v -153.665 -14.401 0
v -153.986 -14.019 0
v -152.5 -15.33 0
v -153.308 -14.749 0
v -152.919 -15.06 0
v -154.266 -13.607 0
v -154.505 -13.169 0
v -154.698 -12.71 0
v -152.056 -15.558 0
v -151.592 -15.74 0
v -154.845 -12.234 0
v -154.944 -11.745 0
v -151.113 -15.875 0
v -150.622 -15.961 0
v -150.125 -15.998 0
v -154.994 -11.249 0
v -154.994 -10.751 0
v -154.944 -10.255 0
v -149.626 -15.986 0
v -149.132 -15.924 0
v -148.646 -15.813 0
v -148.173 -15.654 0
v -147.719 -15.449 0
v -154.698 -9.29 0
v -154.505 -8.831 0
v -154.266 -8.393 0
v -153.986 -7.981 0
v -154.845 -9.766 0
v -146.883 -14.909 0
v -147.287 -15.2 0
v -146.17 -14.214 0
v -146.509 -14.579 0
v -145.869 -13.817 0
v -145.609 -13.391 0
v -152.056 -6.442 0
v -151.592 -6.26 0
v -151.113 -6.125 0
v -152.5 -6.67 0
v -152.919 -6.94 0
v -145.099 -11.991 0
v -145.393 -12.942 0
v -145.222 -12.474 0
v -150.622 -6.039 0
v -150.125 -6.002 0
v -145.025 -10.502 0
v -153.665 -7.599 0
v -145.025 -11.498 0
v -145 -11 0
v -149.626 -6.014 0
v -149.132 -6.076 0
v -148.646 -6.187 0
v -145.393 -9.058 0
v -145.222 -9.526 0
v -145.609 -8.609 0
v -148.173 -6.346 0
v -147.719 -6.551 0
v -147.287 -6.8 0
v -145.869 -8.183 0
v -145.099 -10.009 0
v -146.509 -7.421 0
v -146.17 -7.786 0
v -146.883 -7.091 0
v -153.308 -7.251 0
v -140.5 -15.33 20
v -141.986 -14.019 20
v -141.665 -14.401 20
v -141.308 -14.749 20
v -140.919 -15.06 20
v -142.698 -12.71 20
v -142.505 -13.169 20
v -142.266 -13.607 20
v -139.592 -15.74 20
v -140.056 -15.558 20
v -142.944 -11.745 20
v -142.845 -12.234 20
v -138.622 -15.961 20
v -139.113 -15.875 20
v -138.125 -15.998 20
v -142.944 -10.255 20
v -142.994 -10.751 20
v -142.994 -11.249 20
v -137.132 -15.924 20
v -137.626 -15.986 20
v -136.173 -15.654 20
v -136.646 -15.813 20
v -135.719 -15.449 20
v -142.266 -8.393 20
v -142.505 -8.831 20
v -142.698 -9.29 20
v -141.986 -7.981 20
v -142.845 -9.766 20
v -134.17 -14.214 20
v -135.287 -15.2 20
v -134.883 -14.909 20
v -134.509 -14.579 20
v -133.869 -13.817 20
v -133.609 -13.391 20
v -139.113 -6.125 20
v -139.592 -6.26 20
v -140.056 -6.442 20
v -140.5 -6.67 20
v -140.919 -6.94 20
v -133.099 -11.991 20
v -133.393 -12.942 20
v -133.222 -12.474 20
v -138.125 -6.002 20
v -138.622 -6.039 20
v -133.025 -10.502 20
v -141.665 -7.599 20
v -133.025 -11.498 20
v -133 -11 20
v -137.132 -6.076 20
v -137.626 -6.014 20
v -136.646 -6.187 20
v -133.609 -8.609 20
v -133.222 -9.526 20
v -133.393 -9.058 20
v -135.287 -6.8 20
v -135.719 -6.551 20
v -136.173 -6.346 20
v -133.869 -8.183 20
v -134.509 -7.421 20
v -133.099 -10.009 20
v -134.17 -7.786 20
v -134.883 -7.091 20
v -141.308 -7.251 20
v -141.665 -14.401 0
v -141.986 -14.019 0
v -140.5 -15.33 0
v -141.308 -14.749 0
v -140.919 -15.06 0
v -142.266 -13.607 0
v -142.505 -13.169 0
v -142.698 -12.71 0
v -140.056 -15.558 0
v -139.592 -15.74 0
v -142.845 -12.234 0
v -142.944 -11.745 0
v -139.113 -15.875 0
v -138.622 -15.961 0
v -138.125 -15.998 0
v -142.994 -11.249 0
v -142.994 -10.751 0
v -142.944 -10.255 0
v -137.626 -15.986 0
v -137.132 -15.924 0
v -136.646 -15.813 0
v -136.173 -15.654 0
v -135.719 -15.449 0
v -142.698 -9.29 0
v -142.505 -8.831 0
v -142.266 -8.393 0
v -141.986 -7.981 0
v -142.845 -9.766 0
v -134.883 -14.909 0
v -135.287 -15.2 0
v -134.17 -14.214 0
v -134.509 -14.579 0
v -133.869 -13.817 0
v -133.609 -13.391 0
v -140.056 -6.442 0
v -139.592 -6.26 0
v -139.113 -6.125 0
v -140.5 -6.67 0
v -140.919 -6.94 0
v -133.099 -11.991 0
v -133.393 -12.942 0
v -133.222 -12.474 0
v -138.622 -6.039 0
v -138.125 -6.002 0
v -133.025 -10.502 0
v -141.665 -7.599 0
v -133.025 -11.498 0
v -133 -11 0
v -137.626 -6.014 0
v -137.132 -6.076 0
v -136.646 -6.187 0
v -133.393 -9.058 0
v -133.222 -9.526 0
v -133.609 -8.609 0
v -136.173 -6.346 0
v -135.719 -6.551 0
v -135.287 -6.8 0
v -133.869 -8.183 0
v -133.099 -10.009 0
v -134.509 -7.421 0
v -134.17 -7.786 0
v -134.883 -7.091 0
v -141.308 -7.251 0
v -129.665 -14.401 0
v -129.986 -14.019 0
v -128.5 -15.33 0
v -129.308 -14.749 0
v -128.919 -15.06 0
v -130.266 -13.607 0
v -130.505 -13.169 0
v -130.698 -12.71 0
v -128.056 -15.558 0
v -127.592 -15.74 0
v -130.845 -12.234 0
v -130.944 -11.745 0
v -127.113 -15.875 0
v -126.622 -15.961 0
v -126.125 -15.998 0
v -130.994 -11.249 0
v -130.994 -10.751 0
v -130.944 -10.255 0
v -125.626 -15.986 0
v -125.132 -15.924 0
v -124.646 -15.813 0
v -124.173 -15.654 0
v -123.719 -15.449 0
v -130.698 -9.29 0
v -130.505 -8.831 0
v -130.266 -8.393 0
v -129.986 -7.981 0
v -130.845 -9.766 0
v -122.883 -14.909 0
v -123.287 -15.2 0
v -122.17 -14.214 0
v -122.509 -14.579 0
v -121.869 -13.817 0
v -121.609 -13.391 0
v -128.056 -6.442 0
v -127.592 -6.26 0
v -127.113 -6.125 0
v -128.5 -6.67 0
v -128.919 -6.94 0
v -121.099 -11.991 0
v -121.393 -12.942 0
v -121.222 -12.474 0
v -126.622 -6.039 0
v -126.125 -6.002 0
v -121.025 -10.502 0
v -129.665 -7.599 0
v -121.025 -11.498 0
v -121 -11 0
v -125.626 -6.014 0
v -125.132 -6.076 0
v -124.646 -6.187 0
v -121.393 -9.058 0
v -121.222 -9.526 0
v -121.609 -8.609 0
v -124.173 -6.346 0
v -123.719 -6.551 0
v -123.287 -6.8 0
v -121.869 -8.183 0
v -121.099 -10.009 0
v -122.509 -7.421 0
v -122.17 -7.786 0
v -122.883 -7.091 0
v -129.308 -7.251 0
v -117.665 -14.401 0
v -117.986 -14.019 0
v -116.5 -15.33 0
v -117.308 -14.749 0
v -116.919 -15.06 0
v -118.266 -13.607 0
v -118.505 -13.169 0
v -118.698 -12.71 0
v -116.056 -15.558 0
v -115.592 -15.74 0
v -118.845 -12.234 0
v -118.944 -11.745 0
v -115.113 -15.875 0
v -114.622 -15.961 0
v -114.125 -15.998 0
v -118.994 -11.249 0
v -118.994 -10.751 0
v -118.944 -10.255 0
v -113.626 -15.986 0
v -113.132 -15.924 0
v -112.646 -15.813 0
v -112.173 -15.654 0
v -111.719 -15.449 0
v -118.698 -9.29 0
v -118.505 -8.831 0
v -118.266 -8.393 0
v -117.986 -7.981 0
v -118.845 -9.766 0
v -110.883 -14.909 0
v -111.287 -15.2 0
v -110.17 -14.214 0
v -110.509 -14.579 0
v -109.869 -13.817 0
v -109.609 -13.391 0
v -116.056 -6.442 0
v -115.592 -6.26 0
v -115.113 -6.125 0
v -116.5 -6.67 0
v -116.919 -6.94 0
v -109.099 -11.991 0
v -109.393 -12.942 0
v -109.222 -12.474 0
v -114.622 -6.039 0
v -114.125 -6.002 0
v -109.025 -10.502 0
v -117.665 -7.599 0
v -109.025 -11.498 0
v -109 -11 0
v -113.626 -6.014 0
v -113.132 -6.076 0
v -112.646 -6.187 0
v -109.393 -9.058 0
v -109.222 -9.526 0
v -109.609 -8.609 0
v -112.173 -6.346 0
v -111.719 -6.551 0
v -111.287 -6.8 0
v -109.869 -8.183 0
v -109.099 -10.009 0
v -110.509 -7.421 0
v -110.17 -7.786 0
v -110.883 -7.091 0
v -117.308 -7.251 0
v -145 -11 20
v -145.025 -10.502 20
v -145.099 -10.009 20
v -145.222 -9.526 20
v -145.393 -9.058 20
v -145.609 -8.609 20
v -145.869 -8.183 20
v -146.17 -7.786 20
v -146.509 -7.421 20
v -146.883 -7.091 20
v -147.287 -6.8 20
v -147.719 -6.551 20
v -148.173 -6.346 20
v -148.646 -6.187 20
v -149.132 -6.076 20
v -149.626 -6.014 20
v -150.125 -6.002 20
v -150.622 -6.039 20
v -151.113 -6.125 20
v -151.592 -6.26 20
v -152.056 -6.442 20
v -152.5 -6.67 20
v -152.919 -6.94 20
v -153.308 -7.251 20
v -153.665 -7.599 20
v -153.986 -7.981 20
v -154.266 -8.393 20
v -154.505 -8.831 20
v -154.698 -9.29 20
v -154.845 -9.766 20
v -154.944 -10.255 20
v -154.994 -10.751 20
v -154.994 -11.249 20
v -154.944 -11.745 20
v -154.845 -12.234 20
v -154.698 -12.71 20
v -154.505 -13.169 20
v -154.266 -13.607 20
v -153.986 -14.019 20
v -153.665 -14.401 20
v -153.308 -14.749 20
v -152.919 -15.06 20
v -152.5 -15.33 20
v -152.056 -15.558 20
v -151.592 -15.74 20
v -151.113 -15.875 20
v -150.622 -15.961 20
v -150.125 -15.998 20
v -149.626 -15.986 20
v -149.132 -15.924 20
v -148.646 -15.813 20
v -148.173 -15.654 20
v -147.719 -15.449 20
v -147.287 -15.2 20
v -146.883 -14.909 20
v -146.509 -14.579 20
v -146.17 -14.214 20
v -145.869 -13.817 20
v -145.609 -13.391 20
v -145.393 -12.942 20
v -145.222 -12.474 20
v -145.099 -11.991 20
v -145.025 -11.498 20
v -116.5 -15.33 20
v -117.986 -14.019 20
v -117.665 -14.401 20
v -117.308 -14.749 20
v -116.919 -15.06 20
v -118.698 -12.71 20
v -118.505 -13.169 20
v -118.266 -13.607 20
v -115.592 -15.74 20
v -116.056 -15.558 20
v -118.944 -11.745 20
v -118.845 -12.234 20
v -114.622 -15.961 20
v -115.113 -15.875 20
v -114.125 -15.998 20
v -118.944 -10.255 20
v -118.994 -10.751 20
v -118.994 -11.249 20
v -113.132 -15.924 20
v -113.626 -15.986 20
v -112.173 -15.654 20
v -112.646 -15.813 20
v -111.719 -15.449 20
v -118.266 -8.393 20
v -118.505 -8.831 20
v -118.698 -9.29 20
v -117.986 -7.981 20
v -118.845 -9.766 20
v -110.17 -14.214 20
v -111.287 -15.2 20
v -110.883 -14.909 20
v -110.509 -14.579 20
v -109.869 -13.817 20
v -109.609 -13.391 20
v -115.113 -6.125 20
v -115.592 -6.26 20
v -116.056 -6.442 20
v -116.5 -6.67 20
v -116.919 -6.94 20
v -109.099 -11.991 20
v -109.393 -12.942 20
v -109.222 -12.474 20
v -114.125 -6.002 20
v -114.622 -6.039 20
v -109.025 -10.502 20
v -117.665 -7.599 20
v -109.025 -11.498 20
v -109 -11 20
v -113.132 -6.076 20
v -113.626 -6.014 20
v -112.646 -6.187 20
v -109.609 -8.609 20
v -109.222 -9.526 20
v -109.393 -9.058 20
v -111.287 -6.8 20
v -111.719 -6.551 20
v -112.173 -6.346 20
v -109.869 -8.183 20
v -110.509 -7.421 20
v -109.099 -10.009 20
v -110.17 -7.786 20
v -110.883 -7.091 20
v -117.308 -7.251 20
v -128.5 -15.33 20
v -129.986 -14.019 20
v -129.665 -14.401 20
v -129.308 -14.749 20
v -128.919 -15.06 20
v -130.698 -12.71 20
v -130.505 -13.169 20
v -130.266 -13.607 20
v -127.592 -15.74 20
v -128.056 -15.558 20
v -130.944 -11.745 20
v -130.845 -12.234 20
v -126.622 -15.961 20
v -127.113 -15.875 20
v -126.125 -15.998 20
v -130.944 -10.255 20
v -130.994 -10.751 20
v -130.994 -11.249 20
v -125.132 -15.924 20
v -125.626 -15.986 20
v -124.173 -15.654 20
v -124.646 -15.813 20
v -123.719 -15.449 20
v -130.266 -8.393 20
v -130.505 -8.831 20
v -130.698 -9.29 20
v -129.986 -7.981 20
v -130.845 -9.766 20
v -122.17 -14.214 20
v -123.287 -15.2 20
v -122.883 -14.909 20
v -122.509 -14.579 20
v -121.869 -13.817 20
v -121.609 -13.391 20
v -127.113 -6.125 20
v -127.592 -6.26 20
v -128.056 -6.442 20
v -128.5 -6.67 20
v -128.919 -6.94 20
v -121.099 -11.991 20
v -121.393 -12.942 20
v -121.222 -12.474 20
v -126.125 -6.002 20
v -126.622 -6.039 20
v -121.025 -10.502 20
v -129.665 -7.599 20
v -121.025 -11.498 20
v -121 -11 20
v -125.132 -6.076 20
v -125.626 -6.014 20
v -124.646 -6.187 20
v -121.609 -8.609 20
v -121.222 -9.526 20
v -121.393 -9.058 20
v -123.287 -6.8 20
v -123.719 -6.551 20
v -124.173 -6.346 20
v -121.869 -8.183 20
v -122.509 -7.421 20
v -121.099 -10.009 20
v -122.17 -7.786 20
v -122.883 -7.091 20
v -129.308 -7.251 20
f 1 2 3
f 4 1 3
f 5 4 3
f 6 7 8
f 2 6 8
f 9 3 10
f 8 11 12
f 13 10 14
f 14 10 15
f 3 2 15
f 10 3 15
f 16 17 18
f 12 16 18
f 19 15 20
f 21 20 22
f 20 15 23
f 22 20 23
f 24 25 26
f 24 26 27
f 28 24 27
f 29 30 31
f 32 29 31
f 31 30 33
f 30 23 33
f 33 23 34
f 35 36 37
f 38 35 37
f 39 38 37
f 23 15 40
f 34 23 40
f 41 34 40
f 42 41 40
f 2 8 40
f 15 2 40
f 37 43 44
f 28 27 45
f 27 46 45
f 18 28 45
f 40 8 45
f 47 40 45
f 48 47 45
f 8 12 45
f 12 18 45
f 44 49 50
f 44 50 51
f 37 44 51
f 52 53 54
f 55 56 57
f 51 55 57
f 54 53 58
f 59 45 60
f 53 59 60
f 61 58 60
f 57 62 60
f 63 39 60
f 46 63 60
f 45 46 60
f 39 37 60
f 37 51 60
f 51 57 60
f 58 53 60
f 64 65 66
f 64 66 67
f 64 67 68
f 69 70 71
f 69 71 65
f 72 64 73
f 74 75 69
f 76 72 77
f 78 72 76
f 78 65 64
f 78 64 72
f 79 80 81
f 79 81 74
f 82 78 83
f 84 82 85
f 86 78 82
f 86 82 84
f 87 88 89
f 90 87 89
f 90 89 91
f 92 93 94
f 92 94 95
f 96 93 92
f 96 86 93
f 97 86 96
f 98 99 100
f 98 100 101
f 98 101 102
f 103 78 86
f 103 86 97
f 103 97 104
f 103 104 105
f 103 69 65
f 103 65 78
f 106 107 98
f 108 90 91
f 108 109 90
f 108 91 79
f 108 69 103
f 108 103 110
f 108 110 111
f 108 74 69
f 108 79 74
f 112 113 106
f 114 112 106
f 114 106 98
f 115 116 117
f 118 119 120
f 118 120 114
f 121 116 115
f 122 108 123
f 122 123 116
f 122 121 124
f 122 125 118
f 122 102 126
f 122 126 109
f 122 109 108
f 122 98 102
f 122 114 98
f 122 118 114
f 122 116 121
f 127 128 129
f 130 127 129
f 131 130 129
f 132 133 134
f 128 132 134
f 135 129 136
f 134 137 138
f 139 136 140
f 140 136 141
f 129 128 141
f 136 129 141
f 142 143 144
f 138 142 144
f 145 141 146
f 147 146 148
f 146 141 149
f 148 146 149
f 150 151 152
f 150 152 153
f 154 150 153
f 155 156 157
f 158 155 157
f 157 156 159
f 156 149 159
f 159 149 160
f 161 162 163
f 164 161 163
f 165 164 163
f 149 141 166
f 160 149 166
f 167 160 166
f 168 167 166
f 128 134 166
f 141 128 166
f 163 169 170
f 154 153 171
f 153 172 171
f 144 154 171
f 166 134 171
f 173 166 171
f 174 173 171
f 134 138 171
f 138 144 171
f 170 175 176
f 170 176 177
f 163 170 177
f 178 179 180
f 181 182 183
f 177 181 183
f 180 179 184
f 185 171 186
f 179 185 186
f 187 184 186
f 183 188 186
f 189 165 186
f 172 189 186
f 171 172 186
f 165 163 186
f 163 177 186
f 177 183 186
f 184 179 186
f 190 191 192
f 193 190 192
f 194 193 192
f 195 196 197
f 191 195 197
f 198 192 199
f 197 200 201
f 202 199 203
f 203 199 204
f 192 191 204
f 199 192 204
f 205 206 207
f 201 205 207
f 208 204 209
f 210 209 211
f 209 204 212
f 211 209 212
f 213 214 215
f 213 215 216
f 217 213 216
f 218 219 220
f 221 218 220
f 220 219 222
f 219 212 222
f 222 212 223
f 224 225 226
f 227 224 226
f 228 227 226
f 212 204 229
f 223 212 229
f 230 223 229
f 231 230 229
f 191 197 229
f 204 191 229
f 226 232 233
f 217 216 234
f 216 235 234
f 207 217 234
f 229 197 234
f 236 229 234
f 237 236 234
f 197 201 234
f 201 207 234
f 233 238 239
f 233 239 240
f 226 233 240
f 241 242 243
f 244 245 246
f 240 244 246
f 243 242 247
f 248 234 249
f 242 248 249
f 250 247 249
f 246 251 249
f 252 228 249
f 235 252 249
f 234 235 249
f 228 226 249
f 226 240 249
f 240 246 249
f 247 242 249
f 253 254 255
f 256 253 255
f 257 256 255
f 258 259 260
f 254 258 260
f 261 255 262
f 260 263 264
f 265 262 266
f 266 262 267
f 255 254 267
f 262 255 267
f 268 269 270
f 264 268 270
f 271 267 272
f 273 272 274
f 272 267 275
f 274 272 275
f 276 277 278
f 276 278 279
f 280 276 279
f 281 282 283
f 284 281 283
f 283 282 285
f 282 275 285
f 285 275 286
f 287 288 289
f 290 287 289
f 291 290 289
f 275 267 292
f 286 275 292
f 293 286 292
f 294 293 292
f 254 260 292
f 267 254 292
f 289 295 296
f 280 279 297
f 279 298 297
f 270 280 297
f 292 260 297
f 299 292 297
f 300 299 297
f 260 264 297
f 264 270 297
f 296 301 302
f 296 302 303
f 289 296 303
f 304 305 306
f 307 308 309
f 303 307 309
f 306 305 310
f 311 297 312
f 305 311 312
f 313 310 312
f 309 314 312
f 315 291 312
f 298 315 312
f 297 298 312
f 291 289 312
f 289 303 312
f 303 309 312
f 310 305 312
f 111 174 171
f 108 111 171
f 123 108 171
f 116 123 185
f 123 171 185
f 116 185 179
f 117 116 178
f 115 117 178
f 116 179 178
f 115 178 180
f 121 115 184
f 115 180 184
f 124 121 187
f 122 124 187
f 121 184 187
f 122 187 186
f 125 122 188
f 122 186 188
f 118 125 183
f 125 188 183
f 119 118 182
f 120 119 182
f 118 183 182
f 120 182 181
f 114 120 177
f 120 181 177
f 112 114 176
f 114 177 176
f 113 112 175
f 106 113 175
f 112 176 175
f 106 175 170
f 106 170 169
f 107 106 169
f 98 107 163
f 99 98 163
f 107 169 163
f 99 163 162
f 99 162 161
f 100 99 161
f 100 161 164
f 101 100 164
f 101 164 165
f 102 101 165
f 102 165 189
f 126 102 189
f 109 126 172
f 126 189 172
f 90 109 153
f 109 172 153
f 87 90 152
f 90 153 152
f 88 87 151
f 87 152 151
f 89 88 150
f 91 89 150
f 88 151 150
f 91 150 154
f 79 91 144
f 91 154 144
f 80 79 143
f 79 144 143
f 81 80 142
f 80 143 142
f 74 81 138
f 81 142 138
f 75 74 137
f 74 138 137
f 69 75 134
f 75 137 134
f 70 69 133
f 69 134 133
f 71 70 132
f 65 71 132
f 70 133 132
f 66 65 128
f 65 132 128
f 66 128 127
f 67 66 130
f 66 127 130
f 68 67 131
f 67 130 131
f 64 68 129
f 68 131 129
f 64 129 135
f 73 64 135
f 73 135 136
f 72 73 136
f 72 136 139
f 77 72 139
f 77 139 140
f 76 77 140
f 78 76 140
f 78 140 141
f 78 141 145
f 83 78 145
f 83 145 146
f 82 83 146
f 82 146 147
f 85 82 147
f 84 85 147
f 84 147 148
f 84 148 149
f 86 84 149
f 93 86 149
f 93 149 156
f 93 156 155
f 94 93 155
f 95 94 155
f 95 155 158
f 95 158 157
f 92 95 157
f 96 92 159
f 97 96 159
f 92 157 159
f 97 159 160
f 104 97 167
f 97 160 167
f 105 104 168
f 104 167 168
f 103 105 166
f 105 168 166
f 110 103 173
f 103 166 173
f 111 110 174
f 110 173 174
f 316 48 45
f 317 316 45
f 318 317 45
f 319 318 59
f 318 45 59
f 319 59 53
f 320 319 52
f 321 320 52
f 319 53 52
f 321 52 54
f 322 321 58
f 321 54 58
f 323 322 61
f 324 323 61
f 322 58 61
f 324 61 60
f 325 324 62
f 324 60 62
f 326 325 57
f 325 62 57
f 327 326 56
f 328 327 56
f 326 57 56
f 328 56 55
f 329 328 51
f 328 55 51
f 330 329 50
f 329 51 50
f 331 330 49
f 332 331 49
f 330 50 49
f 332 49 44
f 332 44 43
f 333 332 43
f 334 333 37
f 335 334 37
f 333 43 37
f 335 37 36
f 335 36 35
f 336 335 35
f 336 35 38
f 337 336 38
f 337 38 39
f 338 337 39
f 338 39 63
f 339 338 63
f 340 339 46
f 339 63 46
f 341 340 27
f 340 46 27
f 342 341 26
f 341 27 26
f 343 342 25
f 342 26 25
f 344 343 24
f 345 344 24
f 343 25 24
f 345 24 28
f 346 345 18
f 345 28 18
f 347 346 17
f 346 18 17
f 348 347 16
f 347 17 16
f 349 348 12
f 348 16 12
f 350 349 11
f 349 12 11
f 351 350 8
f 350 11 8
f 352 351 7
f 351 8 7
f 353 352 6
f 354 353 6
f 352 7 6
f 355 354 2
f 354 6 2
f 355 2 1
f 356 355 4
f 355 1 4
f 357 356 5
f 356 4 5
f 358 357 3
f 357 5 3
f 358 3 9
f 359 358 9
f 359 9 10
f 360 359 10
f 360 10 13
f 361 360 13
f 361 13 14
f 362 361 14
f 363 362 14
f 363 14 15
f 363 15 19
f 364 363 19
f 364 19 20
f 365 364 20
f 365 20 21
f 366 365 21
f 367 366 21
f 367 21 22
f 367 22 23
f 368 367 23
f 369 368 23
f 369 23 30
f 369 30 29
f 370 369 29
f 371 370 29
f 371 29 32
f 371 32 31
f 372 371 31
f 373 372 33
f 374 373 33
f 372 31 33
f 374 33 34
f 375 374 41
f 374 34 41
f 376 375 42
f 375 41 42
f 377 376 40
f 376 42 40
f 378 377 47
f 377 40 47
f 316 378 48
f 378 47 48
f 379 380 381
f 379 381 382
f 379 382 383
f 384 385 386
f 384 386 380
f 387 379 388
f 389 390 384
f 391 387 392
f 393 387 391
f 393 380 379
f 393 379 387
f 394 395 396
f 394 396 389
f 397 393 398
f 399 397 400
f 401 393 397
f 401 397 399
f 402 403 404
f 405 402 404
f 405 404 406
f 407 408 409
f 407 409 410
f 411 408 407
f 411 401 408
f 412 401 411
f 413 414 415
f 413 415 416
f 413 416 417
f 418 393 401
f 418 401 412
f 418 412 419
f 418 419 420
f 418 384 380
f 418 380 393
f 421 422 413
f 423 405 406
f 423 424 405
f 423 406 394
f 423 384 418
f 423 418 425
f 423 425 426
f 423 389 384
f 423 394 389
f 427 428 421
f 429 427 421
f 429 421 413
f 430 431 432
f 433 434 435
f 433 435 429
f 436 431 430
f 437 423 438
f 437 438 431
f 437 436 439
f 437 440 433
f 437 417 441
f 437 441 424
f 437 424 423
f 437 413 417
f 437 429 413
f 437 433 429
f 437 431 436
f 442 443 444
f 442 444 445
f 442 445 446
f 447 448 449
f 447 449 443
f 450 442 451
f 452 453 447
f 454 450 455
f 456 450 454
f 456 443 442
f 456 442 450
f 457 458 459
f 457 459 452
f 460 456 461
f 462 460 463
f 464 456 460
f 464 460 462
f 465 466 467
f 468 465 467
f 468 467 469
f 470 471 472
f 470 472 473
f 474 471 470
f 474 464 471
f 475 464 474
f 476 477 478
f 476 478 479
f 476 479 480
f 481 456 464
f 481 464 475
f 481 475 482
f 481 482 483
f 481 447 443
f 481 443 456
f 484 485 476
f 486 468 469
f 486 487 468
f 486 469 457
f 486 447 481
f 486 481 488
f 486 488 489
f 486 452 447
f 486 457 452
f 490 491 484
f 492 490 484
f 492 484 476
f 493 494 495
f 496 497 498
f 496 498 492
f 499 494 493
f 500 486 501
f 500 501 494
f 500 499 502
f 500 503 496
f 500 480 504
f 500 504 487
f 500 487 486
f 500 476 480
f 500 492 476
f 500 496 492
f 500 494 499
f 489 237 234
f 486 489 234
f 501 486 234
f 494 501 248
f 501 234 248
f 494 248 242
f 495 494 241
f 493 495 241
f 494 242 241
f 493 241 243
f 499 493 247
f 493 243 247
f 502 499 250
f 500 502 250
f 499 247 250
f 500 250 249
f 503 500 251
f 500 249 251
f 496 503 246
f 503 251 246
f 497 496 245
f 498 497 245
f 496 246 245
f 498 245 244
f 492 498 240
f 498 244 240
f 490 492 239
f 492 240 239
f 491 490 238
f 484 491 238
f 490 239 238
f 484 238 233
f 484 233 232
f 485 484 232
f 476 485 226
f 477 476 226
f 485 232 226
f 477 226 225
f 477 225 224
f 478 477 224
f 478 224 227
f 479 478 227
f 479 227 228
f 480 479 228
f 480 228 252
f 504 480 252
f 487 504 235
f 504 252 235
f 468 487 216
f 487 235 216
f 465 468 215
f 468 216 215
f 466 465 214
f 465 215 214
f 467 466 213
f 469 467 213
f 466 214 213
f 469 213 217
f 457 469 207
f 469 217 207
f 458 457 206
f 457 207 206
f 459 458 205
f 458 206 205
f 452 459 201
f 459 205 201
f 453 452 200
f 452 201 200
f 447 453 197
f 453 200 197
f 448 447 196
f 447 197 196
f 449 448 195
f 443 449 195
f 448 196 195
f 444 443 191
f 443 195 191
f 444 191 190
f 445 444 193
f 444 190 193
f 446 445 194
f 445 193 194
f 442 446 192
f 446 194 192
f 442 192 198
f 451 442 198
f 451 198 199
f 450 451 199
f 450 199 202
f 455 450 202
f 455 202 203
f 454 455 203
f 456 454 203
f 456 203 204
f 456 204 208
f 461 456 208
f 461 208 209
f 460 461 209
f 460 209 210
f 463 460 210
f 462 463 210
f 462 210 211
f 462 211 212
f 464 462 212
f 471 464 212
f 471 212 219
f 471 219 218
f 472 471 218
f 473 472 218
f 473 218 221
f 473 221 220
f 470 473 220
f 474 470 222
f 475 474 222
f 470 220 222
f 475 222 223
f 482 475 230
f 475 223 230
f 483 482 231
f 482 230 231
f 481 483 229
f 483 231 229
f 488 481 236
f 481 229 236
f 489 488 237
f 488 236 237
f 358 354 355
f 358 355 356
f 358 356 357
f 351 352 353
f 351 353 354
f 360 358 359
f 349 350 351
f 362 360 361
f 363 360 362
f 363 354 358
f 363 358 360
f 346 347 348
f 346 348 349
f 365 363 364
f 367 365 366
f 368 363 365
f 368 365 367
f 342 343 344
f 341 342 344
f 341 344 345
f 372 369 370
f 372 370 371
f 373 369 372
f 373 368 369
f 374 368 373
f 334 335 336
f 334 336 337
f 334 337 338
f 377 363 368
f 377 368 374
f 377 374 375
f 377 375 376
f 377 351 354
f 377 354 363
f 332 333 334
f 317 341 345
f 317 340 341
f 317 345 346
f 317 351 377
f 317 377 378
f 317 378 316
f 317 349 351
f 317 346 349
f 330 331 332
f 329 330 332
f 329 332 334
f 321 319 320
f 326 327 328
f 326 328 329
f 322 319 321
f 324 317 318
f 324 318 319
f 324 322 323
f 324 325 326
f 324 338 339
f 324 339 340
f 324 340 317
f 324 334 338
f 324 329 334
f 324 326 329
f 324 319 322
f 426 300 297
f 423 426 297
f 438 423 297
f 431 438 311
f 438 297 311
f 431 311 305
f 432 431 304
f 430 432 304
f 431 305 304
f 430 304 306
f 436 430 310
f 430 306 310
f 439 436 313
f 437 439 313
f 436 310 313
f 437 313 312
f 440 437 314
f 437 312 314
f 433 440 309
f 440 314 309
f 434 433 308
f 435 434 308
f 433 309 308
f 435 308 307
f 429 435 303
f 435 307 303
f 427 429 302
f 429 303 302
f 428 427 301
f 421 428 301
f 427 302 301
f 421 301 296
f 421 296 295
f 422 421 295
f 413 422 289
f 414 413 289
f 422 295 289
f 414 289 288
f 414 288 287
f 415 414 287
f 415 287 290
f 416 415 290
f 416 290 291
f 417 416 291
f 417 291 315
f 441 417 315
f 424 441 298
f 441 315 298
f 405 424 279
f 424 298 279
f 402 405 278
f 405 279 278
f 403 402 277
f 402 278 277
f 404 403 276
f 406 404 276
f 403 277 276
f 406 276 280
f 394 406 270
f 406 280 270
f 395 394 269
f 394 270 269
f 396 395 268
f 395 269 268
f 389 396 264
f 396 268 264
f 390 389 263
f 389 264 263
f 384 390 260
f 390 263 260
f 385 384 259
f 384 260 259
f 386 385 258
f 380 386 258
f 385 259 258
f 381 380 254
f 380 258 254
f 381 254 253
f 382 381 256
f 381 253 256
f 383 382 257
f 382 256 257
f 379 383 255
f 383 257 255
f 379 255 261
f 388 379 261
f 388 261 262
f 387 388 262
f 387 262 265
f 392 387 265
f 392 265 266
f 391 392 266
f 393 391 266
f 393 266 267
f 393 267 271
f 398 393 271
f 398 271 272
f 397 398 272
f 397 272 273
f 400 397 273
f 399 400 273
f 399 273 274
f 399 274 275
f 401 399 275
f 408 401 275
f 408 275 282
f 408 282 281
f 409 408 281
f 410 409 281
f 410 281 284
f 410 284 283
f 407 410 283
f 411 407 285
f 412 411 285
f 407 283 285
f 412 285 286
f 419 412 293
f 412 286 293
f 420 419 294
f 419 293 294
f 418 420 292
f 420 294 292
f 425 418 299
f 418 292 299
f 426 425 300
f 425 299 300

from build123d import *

# Parameters (mm, degrees)
F0_R     = 5
F1_DEPTH = 20


# Not quite as in the source:
# - the program builds the solid bodies; features that only make, move or delete a surface that nothing else refers to are left out


with BuildPart() as f1:
    # F0 (on Top) → F1 (new body)
    with BuildSketch(Plane.XY):
        with Locations((-150, -11)):
            Circle(F0_R)
    extrude(amount=F1_DEPTH)


with BuildPart() as f1b:
    # F0 (on Top) → F1, piece 2 (new body)
    with BuildSketch(Plane.XY):
        with Locations((-138, -11)):
            Circle(F0_R)
    extrude(amount=F1_DEPTH)


with BuildPart() as f1c:
    # F0 (on Top) → F1, piece 3 (new body)
    with BuildSketch(Plane.XY):
        with Locations((-126, -11)):
            Circle(F0_R)
    extrude(amount=F1_DEPTH)


with BuildPart() as f1d:
    # F0 (on Top) → F1, piece 4 (new body)
    with BuildSketch(Plane.XY):
        with Locations((-114, -11)):
            Circle(F0_R)
    extrude(amount=F1_DEPTH)


solid = Compound([f1.part, f1b.part, f1c.part, f1d.part])
